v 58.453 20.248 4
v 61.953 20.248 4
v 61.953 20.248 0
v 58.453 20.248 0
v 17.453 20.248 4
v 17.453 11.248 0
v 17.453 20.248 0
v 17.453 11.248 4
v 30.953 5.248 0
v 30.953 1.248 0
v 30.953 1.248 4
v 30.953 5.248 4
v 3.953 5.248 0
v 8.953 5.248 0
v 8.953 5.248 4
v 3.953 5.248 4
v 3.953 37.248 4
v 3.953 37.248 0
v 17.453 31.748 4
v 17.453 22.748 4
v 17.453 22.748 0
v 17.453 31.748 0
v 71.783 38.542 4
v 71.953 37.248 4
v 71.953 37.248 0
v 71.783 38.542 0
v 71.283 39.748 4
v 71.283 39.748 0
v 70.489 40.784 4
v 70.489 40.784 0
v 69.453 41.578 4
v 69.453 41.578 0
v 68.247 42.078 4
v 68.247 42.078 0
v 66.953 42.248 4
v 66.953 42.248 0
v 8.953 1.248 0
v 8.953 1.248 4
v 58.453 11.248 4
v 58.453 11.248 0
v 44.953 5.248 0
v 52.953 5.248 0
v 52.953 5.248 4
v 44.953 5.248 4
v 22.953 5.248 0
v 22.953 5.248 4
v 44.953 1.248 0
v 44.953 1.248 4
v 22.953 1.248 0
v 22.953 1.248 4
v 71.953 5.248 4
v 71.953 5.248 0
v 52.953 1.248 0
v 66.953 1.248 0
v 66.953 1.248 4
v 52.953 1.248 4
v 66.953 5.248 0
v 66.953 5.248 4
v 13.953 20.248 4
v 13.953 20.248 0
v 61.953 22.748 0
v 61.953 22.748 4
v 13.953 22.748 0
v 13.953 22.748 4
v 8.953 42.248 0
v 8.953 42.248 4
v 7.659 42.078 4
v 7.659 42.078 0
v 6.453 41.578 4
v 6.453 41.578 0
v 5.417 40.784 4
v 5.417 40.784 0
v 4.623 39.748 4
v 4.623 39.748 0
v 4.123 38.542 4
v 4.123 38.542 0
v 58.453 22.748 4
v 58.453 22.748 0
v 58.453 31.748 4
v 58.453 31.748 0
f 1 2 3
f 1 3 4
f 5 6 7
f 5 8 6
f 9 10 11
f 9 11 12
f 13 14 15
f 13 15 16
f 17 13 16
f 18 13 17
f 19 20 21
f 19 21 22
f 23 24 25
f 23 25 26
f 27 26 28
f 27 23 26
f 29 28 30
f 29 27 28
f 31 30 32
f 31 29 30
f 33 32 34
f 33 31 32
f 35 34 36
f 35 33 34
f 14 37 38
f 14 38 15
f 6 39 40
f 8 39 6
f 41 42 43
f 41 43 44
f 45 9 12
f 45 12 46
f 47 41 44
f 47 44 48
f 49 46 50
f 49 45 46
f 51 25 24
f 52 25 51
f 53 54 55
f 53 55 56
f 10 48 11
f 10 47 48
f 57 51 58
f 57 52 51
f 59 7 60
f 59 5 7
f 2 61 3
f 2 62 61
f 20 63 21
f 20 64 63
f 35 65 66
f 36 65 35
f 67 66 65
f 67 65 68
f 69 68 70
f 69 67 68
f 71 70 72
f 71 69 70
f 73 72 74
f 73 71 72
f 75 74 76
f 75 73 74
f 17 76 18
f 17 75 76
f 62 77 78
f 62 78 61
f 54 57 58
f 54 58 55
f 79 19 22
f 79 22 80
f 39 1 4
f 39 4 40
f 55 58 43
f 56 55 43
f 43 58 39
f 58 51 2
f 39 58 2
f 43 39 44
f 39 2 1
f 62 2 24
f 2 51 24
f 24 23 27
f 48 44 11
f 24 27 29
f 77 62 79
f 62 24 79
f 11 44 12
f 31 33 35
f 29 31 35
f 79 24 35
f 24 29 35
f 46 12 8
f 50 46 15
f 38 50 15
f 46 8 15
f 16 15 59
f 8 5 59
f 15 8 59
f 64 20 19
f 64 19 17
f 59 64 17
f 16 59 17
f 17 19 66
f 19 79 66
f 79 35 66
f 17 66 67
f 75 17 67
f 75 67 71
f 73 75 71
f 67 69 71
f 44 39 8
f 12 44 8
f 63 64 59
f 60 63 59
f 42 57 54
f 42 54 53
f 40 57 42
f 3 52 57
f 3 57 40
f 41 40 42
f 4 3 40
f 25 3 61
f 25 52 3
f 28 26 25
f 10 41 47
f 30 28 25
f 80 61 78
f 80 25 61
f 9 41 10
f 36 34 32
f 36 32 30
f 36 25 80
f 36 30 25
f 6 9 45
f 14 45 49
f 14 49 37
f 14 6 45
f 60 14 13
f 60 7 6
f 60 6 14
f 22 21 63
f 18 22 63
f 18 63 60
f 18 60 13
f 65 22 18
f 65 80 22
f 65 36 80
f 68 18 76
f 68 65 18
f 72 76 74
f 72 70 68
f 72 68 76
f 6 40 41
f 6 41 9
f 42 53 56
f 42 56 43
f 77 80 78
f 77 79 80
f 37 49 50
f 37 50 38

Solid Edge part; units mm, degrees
sketch "Sketch1" plane through (0, 0, 0) normal (0, 0, 1) x (1, 0, 0)
  line L0 (8.953, 5.2481) -> (3.953, 5.2481)
  line L1 (3.953, 5.2481) -> (3.953, 42.2481)
  line L2 (3.953, 42.2481) -> (71.953, 42.2481)
  line L3 (71.953, 42.2481) -> (71.953, 5.2481)
  line L4 (71.953, 5.2481) -> (66.953, 5.2481)
  line L5 (66.953, 5.2481) -> (66.953, 1.2481)
  line L6 (66.953, 1.2481) -> (52.953, 1.2481)
  line L7 (52.953, 1.2481) -> (52.953, 5.2481)
  line L8 (52.953, 5.2481) -> (44.953, 5.2481)
  line L9 (44.953, 5.2481) -> (44.953, 1.2481)
  line L10 (44.953, 1.2481) -> (30.953, 1.2481)
  line L11 (30.953, 1.2481) -> (30.953, 5.2481)
  line L12 (30.953, 5.2481) -> (22.953, 5.2481)
  line L13 (22.953, 5.2481) -> (22.953, 1.2481)
  line L14 (22.953, 1.2481) -> (8.953, 1.2481)
  line L15 (8.953, 1.2481) -> (8.953, 5.2481)
extrude "Protrusion1" add sketch "Sketch1" along normal blind 4
sketch "Sketch2" plane through (37.953, 21.7481, 4) normal (0, 0, 1) x (1, 0, 0)
  line L0 (-20.5, -10.5) -> (-20.5, -1.5)
  line L1 (-20.5, -1.5) -> (-24, -1.5)
  line L2 (-24, -0.25) -> (-24, -1.5)
  line L3 (-24, -0.25) -> (-24, 1)
  line L4 (-24, 1) -> (-20.5, 1)
  line L5 (-20.5, 1) -> (-20.5, 10)
  line L6 (-20.5, 10) -> (20.5, 10)
  line L7 (20.5, 10) -> (20.5, 1)
  line L8 (20.5, 1) -> (24, 1)
  line L9 (24, 1) -> (24, -1.5)
  line L10 (24, -1.5) -> (20.5, -1.5)
  line L11 (20.5, -1.5) -> (20.5, -10.5)
  line L12 (20.5, -10.5) -> (-20.5, -10.5)
extrude "Recorte_Extrudado_1" cut sketch "Sketch2" against normal blind 11.4351
fillet "Redondo_3" radius 5 2 edges at (71.953, 42.2481, 2) (3.953, 42.2481, 2)
